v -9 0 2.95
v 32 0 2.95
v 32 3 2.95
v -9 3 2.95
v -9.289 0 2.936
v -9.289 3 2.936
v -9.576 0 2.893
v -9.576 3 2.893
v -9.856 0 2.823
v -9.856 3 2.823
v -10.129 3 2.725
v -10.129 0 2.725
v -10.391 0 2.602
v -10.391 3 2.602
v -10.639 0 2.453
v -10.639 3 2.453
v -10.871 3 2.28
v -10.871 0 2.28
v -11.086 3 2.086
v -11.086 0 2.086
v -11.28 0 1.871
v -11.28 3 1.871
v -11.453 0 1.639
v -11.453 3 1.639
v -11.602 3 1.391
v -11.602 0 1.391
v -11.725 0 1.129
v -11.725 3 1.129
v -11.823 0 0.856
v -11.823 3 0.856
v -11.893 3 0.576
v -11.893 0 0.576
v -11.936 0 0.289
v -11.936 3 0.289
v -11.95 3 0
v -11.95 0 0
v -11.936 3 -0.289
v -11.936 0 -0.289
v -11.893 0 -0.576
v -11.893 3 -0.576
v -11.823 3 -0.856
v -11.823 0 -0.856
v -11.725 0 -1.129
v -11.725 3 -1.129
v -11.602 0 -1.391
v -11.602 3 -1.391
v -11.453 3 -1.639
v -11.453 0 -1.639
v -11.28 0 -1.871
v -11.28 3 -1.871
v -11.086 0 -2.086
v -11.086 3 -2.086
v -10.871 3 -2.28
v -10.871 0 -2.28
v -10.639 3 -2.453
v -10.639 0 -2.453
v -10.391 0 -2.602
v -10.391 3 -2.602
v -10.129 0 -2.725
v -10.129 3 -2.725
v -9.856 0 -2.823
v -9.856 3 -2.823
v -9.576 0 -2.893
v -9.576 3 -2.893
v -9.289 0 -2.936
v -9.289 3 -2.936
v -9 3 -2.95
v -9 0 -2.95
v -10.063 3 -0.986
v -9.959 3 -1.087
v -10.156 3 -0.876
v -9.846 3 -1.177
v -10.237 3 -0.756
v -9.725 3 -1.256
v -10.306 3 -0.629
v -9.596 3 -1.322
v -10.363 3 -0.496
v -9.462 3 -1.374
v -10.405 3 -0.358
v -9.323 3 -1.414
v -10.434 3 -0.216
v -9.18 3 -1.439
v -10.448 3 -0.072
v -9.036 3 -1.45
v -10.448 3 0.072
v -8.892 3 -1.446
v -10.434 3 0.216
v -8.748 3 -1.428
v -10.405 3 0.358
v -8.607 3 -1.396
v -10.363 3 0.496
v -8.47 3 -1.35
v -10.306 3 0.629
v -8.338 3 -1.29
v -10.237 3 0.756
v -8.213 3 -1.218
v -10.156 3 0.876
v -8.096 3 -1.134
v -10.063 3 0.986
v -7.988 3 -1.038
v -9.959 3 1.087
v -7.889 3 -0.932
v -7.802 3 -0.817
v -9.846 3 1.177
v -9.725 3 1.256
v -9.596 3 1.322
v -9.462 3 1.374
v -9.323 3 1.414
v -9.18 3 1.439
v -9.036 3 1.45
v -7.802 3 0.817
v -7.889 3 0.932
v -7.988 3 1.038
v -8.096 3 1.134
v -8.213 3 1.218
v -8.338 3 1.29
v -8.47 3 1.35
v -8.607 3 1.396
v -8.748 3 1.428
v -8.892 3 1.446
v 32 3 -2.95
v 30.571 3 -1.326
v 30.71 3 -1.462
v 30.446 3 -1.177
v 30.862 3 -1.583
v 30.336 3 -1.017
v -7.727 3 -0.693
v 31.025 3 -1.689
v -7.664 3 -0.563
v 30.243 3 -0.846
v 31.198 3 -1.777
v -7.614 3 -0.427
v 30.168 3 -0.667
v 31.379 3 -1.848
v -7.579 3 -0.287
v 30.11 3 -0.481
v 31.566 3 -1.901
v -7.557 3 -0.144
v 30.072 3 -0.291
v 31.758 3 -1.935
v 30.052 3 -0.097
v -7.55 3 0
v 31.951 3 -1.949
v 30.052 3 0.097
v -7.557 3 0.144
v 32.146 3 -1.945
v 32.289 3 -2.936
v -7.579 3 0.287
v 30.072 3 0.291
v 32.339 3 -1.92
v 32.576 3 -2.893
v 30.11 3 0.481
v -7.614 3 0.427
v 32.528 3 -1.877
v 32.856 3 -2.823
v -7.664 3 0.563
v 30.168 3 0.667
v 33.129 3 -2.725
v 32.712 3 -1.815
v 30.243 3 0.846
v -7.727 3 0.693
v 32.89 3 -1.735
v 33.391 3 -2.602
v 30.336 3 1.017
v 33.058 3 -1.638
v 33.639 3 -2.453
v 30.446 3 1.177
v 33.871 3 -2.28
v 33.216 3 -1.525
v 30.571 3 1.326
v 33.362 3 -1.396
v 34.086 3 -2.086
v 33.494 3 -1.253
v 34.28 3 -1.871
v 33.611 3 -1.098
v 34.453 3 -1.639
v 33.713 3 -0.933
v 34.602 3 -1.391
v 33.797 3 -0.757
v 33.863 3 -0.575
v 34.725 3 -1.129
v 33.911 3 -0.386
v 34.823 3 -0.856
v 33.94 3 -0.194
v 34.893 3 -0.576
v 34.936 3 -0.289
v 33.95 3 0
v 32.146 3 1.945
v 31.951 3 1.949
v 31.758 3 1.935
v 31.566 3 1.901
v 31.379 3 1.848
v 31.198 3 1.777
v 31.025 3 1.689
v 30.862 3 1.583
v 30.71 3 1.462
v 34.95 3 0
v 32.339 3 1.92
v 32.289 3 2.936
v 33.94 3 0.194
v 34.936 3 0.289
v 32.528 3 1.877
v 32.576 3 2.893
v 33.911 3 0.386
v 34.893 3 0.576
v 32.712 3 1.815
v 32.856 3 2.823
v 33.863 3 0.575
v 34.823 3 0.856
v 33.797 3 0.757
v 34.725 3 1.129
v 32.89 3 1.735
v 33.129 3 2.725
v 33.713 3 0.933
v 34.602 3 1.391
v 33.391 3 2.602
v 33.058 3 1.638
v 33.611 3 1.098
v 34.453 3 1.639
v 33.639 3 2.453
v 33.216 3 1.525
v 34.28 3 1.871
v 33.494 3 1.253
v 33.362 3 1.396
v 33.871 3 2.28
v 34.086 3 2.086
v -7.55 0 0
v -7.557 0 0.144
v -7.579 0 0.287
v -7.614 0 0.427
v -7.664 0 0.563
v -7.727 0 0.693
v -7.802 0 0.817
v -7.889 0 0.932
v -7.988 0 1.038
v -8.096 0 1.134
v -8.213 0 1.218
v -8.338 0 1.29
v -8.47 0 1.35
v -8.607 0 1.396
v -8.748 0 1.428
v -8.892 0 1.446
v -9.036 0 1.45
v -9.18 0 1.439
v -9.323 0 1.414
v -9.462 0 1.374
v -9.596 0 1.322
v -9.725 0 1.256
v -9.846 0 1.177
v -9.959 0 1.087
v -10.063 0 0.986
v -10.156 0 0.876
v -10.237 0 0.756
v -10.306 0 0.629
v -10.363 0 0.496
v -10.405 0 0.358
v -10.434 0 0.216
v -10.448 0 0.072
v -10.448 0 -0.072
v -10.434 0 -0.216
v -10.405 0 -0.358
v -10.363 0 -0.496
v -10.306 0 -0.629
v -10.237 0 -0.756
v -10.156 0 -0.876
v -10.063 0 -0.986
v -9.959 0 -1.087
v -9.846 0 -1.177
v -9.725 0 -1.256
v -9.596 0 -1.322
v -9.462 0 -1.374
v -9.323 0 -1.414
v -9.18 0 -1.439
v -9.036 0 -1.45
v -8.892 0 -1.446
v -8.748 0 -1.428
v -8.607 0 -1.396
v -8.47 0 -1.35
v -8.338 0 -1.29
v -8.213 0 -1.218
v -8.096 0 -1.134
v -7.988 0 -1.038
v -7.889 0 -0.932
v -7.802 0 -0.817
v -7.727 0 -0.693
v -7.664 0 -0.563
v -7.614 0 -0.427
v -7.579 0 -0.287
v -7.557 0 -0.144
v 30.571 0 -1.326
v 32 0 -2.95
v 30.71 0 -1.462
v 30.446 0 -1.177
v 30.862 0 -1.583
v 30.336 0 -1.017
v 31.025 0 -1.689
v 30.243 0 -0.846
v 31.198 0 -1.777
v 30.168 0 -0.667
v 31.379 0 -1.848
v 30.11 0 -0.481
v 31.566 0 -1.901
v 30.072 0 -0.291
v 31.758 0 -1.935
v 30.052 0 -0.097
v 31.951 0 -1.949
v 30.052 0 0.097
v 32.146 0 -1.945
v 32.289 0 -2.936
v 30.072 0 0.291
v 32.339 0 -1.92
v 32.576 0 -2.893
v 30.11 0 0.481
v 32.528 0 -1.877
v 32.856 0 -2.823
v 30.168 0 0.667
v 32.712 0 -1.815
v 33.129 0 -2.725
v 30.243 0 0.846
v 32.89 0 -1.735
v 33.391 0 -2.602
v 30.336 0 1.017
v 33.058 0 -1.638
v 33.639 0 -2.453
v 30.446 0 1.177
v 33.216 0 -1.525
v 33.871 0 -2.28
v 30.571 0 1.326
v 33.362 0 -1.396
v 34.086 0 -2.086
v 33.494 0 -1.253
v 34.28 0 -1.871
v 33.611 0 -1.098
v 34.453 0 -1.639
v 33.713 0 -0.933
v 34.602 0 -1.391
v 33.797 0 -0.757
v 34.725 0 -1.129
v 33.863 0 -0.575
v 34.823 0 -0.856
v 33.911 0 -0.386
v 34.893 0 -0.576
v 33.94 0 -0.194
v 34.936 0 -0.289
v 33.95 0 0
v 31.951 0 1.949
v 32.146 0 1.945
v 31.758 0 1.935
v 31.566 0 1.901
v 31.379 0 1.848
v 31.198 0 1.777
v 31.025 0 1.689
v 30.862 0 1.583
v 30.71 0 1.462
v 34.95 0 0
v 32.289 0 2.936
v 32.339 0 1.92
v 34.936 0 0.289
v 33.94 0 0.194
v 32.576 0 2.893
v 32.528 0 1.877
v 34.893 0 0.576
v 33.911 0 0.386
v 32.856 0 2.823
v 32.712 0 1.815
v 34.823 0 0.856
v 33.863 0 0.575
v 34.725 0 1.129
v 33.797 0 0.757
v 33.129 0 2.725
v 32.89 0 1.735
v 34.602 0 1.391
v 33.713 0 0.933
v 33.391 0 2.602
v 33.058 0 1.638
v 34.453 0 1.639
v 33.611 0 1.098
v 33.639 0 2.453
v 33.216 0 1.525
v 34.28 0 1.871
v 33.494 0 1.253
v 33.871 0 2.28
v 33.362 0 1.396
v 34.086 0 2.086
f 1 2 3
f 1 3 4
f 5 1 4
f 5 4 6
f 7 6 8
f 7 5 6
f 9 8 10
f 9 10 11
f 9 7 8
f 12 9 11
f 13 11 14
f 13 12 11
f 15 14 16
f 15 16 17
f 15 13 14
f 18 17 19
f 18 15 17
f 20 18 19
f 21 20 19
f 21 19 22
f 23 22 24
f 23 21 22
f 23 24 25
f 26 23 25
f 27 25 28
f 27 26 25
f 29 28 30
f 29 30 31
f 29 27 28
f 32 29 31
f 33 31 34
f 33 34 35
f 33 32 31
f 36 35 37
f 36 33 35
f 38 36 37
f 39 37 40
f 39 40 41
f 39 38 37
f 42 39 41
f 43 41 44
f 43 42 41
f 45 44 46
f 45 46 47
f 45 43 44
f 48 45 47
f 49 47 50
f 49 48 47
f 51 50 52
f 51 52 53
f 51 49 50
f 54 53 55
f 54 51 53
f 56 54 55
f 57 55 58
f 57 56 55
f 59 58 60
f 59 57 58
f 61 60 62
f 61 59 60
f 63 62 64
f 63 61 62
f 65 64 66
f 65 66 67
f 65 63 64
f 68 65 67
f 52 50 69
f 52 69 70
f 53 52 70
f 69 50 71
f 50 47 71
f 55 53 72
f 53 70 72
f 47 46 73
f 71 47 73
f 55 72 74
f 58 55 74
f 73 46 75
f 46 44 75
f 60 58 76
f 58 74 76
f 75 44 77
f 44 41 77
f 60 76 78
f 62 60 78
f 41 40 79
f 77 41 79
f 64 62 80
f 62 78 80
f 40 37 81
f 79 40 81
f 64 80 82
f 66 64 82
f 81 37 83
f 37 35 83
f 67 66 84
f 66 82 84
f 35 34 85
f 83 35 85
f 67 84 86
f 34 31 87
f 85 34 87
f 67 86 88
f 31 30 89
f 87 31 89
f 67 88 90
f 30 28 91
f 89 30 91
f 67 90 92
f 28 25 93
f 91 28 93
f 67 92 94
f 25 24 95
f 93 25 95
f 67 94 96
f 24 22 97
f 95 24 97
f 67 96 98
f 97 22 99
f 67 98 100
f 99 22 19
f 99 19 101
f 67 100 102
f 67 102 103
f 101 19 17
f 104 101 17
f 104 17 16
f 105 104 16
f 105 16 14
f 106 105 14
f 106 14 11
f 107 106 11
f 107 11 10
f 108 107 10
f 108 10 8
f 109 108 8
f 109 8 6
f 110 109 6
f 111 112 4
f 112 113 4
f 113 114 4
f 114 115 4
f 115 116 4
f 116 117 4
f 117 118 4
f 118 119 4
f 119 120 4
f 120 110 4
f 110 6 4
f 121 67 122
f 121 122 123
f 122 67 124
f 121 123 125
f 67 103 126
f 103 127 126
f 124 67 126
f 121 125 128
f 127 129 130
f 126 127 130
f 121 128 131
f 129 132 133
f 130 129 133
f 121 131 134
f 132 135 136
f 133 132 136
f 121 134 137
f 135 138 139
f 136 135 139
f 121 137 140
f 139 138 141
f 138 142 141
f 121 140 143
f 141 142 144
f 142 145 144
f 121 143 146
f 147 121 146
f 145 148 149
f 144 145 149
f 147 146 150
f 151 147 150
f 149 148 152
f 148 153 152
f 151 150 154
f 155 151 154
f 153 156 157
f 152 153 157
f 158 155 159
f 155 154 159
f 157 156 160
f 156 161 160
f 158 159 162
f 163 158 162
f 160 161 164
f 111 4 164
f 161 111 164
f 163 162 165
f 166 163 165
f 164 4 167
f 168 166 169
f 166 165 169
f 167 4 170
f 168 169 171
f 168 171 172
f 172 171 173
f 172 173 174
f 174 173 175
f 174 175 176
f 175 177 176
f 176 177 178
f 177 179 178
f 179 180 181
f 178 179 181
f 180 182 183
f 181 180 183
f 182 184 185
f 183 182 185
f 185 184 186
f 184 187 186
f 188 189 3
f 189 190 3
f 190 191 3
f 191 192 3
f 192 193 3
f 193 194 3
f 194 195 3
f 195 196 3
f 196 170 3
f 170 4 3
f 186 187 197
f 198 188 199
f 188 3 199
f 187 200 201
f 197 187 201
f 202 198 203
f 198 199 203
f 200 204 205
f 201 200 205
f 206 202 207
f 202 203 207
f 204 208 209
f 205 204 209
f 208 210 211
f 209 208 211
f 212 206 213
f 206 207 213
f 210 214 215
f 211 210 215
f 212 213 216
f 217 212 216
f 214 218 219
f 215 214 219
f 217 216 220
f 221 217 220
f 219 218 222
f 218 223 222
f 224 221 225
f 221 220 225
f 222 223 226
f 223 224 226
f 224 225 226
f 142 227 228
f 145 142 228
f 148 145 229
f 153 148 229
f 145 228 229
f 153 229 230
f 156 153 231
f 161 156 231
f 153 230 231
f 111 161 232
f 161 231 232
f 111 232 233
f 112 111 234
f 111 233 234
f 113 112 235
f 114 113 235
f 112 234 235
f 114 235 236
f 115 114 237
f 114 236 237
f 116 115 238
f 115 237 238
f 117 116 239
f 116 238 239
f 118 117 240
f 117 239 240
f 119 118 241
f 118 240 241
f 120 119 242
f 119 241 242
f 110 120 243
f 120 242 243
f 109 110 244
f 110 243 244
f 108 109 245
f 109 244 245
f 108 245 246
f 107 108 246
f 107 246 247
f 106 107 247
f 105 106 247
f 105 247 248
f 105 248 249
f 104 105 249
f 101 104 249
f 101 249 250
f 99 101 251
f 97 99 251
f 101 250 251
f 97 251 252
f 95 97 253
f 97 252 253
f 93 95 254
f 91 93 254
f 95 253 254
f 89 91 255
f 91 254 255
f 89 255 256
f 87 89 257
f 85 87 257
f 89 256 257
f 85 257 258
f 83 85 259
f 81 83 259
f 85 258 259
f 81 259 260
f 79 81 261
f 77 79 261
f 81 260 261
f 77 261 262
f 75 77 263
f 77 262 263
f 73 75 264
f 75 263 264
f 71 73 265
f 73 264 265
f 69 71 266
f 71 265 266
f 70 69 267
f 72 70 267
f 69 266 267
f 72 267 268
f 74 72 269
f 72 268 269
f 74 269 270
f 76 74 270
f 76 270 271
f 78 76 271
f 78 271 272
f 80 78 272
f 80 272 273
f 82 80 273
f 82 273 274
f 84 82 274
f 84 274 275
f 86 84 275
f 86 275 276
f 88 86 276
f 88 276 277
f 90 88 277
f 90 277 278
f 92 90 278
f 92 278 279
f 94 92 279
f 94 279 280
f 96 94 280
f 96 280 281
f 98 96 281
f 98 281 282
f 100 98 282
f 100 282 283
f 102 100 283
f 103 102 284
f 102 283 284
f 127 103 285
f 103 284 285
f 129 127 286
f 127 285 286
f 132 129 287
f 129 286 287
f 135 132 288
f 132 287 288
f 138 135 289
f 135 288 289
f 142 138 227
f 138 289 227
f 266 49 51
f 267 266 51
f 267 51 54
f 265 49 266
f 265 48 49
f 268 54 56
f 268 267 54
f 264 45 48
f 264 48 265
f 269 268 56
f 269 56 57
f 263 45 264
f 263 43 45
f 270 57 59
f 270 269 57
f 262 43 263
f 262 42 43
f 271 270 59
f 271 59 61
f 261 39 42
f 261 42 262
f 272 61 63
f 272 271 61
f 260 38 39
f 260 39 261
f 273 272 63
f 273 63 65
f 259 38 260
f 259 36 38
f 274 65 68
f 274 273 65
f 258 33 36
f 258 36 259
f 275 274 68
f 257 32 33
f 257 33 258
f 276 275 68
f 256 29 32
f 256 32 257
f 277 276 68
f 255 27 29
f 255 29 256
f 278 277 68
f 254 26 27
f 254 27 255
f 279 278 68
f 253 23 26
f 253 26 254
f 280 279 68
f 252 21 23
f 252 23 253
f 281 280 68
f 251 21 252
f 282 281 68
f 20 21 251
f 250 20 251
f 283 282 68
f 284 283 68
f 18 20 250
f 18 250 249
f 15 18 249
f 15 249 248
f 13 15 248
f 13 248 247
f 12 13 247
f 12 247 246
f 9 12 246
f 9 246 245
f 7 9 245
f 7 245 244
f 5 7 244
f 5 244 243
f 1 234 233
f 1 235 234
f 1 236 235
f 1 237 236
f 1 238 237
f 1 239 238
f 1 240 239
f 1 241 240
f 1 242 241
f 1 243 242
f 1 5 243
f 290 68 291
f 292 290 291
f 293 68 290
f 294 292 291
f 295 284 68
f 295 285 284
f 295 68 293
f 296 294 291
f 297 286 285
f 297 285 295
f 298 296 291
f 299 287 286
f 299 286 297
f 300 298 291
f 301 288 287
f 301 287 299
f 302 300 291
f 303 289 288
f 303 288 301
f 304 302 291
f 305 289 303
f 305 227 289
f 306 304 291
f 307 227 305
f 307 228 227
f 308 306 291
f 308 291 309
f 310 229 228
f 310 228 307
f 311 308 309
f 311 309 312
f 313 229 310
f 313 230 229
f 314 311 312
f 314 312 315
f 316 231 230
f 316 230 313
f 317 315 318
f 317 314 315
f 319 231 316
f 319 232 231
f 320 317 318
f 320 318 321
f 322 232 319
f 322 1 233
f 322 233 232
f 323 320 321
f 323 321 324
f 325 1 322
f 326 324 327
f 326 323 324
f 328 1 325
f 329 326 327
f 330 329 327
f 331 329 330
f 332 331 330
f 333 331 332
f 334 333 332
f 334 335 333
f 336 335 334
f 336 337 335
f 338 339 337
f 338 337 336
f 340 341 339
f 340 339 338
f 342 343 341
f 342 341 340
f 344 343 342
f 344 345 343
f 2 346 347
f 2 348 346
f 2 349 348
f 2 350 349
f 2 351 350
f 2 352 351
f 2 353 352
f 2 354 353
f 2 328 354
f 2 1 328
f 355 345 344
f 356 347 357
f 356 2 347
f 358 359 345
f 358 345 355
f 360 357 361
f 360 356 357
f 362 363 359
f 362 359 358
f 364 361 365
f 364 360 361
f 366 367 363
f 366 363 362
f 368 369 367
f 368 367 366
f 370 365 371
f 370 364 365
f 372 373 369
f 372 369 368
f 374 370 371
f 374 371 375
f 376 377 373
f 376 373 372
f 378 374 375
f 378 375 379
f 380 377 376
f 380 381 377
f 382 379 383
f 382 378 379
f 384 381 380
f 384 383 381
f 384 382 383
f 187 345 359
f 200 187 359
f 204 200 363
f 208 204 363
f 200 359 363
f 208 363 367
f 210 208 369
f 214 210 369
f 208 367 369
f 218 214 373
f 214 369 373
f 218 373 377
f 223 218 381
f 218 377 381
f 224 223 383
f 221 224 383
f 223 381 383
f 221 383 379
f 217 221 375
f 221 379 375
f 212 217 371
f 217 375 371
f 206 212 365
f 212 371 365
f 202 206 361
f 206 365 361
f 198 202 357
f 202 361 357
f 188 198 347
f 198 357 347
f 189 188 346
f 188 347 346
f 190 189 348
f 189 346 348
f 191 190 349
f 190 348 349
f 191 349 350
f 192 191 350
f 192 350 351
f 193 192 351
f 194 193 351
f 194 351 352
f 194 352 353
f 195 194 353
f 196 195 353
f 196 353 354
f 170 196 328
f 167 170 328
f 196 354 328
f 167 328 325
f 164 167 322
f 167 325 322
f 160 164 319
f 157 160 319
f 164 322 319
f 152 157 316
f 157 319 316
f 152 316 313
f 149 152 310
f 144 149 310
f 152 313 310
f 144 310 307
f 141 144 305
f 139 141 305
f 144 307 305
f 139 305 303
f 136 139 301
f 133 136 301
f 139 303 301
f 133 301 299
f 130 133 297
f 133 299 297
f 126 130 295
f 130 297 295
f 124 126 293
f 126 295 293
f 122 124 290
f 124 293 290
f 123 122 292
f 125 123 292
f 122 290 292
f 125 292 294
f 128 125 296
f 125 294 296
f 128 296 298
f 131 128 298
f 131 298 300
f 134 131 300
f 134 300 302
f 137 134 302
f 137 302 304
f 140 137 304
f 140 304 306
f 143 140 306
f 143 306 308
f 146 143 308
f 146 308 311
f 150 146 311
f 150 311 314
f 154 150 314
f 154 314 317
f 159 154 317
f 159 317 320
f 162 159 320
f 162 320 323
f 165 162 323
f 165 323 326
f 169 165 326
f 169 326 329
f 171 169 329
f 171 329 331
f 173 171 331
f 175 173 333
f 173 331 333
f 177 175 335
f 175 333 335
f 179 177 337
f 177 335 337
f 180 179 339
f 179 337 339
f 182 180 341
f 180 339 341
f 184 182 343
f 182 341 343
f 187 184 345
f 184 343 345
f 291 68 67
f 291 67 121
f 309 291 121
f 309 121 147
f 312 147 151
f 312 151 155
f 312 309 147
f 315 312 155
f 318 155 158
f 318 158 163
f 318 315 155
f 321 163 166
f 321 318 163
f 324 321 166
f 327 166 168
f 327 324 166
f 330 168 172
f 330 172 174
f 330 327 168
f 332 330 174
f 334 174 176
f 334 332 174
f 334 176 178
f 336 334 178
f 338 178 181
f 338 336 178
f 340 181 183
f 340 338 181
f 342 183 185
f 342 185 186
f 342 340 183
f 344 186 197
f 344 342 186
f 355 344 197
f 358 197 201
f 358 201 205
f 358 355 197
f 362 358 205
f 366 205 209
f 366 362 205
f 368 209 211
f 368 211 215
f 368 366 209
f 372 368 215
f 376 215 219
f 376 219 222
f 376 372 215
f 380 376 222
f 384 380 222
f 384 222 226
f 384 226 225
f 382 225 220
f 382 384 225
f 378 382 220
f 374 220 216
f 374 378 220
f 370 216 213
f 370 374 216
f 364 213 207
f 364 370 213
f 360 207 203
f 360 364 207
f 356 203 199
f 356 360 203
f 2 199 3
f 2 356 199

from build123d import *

# Parameters (mm, degrees)
SKETCH1_R           = 1.95
SKETCH1_R_2         = 1.45
BOSS_EXTRUDE1_DEPTH = 3


with BuildPart() as part:
    # Sketch1 → Boss-Extrude1 (new body)
    with BuildSketch(Plane.XZ):
        with BuildLine():
            Line((32, 2.95), (-9, 2.95))
            ThreePointArc((-9, 2.95), (-11.95, 0), (-9, -2.95))
            Line((-9, -2.95), (32, -2.95))
            ThreePointArc((32, -2.95), (34.95, 0), (32, 2.95))
        make_face()
        with Locations((32, 0)):
            Circle(SKETCH1_R, mode=Mode.SUBTRACT)
        with Locations((-9, 0)):
            Circle(SKETCH1_R_2, mode=Mode.SUBTRACT)
    extrude(amount=-BOSS_EXTRUDE1_DEPTH)


solid = part.part
